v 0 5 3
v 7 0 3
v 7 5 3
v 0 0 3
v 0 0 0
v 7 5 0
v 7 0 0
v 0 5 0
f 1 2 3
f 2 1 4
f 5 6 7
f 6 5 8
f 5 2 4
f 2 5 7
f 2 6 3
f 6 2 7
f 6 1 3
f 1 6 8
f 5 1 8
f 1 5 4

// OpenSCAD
// Generated by SolidPython 1.0.1 on 2020-07-29 00:46:55


cube(size = [7, 5, 3]);
/***********************************************
*********      SolidPython code:      **********
************************************************
 
# import packages: SolidPython
from solid import *
from solid.utils import *
from itertools import chain, combinations, permutations


class Resize:

    def __init__(self, scad_file):
        self.scad_file = scad_file
        #self.scad_file = import_scad(scad_file)
        # cone/cylinder param:
        self.r1 = 0
        self.r2 = 0
        self.h = 0
        # rectangular prism param:
        self.w = 0
        self.l = 0
        # ellipse param:
        self.r = 0

    # import OpenScad code (file name corresponds to shape)


    # classify shape + parameters
    def assign(self, param1, param2, param3):
        if self.scad_file == 'cone.scad':
            self.r1 = param1
            self.r2 = param2
            self.h = param3
        elif self.scad_file == 'cylinder.scad':
            self.r1 = param1
            self.r2 = param2
            self.h = param3
        elif self.scad_file == 'rectangularPrism.scad':
            self.h = param1
            self.l = param2
            self.w = param3
        else:
            self.r = param1
            self.h = param2

    # resize parameters
    def iterate(self):
        x = range(3, 20, 2)
        i = 1
        if self.scad_file == 'cone.scad':
            tempList = list(permutations(x, 2))
            for temp in tempList:
                param1 = temp[0]
                param2 = temp[1]
                filepath = 'produced_scad_files/' + 'cone' + str(param1) + '_' + str(param2) + '_' + '.scad'
                scad_render_to_file(cylinder(h=param1, r1=param2, r2=0), filepath)

        elif self.scad_file == 'cylinder.scad':
            tempList = list(permutations(x, 3))
            for temp in tempList:
                param1 = temp[0]
                param2 = temp[1]
                filepath = 'produced_scad_files/' + 'cylinder' + str(param1) + '_' + str(param2) + '_' + '.scad'
                scad_render_to_file(cylinder(h=param1, r1=param2, r2=param2), filepath)

        elif self.scad_file == 'rectangularPrism.scad':
            tempList = list(permutations(x, 3))
            for temp in tempList:
                param1 = temp[0]
                param2 = temp[1]
                param3 = temp[2]
                filepath = 'produced_scad_files/' + 'rectangularPrism' + str(param1) + '_' + str(param2) + '_' + str(
                    param3) + '.scad'
                scad_render_to_file(cube(size=(param1, param2, param3)), filepath)

        elif self.scad_file == 'ellipse.scad':
            tempList = list(permutations(x, 4))
            for temp in tempList:
                param1 = temp[0]
                param2 = temp[1]
                param3 = temp[2]
                param4 = temp[3]
                filepath = 'produced_scad_files/' + 'ellipse' + str(param1) + '_' + str(param2) + '_' + str(param3) + '_' + str(param4) + '.scad'
                scad_render_to_file(scale([param1, param2, param3])(sphere(r=param4)), filepath)

    def render_to_scadfile(self):
        scad_render_to_file(scad, 'example.scad') 
 
************************************************/
